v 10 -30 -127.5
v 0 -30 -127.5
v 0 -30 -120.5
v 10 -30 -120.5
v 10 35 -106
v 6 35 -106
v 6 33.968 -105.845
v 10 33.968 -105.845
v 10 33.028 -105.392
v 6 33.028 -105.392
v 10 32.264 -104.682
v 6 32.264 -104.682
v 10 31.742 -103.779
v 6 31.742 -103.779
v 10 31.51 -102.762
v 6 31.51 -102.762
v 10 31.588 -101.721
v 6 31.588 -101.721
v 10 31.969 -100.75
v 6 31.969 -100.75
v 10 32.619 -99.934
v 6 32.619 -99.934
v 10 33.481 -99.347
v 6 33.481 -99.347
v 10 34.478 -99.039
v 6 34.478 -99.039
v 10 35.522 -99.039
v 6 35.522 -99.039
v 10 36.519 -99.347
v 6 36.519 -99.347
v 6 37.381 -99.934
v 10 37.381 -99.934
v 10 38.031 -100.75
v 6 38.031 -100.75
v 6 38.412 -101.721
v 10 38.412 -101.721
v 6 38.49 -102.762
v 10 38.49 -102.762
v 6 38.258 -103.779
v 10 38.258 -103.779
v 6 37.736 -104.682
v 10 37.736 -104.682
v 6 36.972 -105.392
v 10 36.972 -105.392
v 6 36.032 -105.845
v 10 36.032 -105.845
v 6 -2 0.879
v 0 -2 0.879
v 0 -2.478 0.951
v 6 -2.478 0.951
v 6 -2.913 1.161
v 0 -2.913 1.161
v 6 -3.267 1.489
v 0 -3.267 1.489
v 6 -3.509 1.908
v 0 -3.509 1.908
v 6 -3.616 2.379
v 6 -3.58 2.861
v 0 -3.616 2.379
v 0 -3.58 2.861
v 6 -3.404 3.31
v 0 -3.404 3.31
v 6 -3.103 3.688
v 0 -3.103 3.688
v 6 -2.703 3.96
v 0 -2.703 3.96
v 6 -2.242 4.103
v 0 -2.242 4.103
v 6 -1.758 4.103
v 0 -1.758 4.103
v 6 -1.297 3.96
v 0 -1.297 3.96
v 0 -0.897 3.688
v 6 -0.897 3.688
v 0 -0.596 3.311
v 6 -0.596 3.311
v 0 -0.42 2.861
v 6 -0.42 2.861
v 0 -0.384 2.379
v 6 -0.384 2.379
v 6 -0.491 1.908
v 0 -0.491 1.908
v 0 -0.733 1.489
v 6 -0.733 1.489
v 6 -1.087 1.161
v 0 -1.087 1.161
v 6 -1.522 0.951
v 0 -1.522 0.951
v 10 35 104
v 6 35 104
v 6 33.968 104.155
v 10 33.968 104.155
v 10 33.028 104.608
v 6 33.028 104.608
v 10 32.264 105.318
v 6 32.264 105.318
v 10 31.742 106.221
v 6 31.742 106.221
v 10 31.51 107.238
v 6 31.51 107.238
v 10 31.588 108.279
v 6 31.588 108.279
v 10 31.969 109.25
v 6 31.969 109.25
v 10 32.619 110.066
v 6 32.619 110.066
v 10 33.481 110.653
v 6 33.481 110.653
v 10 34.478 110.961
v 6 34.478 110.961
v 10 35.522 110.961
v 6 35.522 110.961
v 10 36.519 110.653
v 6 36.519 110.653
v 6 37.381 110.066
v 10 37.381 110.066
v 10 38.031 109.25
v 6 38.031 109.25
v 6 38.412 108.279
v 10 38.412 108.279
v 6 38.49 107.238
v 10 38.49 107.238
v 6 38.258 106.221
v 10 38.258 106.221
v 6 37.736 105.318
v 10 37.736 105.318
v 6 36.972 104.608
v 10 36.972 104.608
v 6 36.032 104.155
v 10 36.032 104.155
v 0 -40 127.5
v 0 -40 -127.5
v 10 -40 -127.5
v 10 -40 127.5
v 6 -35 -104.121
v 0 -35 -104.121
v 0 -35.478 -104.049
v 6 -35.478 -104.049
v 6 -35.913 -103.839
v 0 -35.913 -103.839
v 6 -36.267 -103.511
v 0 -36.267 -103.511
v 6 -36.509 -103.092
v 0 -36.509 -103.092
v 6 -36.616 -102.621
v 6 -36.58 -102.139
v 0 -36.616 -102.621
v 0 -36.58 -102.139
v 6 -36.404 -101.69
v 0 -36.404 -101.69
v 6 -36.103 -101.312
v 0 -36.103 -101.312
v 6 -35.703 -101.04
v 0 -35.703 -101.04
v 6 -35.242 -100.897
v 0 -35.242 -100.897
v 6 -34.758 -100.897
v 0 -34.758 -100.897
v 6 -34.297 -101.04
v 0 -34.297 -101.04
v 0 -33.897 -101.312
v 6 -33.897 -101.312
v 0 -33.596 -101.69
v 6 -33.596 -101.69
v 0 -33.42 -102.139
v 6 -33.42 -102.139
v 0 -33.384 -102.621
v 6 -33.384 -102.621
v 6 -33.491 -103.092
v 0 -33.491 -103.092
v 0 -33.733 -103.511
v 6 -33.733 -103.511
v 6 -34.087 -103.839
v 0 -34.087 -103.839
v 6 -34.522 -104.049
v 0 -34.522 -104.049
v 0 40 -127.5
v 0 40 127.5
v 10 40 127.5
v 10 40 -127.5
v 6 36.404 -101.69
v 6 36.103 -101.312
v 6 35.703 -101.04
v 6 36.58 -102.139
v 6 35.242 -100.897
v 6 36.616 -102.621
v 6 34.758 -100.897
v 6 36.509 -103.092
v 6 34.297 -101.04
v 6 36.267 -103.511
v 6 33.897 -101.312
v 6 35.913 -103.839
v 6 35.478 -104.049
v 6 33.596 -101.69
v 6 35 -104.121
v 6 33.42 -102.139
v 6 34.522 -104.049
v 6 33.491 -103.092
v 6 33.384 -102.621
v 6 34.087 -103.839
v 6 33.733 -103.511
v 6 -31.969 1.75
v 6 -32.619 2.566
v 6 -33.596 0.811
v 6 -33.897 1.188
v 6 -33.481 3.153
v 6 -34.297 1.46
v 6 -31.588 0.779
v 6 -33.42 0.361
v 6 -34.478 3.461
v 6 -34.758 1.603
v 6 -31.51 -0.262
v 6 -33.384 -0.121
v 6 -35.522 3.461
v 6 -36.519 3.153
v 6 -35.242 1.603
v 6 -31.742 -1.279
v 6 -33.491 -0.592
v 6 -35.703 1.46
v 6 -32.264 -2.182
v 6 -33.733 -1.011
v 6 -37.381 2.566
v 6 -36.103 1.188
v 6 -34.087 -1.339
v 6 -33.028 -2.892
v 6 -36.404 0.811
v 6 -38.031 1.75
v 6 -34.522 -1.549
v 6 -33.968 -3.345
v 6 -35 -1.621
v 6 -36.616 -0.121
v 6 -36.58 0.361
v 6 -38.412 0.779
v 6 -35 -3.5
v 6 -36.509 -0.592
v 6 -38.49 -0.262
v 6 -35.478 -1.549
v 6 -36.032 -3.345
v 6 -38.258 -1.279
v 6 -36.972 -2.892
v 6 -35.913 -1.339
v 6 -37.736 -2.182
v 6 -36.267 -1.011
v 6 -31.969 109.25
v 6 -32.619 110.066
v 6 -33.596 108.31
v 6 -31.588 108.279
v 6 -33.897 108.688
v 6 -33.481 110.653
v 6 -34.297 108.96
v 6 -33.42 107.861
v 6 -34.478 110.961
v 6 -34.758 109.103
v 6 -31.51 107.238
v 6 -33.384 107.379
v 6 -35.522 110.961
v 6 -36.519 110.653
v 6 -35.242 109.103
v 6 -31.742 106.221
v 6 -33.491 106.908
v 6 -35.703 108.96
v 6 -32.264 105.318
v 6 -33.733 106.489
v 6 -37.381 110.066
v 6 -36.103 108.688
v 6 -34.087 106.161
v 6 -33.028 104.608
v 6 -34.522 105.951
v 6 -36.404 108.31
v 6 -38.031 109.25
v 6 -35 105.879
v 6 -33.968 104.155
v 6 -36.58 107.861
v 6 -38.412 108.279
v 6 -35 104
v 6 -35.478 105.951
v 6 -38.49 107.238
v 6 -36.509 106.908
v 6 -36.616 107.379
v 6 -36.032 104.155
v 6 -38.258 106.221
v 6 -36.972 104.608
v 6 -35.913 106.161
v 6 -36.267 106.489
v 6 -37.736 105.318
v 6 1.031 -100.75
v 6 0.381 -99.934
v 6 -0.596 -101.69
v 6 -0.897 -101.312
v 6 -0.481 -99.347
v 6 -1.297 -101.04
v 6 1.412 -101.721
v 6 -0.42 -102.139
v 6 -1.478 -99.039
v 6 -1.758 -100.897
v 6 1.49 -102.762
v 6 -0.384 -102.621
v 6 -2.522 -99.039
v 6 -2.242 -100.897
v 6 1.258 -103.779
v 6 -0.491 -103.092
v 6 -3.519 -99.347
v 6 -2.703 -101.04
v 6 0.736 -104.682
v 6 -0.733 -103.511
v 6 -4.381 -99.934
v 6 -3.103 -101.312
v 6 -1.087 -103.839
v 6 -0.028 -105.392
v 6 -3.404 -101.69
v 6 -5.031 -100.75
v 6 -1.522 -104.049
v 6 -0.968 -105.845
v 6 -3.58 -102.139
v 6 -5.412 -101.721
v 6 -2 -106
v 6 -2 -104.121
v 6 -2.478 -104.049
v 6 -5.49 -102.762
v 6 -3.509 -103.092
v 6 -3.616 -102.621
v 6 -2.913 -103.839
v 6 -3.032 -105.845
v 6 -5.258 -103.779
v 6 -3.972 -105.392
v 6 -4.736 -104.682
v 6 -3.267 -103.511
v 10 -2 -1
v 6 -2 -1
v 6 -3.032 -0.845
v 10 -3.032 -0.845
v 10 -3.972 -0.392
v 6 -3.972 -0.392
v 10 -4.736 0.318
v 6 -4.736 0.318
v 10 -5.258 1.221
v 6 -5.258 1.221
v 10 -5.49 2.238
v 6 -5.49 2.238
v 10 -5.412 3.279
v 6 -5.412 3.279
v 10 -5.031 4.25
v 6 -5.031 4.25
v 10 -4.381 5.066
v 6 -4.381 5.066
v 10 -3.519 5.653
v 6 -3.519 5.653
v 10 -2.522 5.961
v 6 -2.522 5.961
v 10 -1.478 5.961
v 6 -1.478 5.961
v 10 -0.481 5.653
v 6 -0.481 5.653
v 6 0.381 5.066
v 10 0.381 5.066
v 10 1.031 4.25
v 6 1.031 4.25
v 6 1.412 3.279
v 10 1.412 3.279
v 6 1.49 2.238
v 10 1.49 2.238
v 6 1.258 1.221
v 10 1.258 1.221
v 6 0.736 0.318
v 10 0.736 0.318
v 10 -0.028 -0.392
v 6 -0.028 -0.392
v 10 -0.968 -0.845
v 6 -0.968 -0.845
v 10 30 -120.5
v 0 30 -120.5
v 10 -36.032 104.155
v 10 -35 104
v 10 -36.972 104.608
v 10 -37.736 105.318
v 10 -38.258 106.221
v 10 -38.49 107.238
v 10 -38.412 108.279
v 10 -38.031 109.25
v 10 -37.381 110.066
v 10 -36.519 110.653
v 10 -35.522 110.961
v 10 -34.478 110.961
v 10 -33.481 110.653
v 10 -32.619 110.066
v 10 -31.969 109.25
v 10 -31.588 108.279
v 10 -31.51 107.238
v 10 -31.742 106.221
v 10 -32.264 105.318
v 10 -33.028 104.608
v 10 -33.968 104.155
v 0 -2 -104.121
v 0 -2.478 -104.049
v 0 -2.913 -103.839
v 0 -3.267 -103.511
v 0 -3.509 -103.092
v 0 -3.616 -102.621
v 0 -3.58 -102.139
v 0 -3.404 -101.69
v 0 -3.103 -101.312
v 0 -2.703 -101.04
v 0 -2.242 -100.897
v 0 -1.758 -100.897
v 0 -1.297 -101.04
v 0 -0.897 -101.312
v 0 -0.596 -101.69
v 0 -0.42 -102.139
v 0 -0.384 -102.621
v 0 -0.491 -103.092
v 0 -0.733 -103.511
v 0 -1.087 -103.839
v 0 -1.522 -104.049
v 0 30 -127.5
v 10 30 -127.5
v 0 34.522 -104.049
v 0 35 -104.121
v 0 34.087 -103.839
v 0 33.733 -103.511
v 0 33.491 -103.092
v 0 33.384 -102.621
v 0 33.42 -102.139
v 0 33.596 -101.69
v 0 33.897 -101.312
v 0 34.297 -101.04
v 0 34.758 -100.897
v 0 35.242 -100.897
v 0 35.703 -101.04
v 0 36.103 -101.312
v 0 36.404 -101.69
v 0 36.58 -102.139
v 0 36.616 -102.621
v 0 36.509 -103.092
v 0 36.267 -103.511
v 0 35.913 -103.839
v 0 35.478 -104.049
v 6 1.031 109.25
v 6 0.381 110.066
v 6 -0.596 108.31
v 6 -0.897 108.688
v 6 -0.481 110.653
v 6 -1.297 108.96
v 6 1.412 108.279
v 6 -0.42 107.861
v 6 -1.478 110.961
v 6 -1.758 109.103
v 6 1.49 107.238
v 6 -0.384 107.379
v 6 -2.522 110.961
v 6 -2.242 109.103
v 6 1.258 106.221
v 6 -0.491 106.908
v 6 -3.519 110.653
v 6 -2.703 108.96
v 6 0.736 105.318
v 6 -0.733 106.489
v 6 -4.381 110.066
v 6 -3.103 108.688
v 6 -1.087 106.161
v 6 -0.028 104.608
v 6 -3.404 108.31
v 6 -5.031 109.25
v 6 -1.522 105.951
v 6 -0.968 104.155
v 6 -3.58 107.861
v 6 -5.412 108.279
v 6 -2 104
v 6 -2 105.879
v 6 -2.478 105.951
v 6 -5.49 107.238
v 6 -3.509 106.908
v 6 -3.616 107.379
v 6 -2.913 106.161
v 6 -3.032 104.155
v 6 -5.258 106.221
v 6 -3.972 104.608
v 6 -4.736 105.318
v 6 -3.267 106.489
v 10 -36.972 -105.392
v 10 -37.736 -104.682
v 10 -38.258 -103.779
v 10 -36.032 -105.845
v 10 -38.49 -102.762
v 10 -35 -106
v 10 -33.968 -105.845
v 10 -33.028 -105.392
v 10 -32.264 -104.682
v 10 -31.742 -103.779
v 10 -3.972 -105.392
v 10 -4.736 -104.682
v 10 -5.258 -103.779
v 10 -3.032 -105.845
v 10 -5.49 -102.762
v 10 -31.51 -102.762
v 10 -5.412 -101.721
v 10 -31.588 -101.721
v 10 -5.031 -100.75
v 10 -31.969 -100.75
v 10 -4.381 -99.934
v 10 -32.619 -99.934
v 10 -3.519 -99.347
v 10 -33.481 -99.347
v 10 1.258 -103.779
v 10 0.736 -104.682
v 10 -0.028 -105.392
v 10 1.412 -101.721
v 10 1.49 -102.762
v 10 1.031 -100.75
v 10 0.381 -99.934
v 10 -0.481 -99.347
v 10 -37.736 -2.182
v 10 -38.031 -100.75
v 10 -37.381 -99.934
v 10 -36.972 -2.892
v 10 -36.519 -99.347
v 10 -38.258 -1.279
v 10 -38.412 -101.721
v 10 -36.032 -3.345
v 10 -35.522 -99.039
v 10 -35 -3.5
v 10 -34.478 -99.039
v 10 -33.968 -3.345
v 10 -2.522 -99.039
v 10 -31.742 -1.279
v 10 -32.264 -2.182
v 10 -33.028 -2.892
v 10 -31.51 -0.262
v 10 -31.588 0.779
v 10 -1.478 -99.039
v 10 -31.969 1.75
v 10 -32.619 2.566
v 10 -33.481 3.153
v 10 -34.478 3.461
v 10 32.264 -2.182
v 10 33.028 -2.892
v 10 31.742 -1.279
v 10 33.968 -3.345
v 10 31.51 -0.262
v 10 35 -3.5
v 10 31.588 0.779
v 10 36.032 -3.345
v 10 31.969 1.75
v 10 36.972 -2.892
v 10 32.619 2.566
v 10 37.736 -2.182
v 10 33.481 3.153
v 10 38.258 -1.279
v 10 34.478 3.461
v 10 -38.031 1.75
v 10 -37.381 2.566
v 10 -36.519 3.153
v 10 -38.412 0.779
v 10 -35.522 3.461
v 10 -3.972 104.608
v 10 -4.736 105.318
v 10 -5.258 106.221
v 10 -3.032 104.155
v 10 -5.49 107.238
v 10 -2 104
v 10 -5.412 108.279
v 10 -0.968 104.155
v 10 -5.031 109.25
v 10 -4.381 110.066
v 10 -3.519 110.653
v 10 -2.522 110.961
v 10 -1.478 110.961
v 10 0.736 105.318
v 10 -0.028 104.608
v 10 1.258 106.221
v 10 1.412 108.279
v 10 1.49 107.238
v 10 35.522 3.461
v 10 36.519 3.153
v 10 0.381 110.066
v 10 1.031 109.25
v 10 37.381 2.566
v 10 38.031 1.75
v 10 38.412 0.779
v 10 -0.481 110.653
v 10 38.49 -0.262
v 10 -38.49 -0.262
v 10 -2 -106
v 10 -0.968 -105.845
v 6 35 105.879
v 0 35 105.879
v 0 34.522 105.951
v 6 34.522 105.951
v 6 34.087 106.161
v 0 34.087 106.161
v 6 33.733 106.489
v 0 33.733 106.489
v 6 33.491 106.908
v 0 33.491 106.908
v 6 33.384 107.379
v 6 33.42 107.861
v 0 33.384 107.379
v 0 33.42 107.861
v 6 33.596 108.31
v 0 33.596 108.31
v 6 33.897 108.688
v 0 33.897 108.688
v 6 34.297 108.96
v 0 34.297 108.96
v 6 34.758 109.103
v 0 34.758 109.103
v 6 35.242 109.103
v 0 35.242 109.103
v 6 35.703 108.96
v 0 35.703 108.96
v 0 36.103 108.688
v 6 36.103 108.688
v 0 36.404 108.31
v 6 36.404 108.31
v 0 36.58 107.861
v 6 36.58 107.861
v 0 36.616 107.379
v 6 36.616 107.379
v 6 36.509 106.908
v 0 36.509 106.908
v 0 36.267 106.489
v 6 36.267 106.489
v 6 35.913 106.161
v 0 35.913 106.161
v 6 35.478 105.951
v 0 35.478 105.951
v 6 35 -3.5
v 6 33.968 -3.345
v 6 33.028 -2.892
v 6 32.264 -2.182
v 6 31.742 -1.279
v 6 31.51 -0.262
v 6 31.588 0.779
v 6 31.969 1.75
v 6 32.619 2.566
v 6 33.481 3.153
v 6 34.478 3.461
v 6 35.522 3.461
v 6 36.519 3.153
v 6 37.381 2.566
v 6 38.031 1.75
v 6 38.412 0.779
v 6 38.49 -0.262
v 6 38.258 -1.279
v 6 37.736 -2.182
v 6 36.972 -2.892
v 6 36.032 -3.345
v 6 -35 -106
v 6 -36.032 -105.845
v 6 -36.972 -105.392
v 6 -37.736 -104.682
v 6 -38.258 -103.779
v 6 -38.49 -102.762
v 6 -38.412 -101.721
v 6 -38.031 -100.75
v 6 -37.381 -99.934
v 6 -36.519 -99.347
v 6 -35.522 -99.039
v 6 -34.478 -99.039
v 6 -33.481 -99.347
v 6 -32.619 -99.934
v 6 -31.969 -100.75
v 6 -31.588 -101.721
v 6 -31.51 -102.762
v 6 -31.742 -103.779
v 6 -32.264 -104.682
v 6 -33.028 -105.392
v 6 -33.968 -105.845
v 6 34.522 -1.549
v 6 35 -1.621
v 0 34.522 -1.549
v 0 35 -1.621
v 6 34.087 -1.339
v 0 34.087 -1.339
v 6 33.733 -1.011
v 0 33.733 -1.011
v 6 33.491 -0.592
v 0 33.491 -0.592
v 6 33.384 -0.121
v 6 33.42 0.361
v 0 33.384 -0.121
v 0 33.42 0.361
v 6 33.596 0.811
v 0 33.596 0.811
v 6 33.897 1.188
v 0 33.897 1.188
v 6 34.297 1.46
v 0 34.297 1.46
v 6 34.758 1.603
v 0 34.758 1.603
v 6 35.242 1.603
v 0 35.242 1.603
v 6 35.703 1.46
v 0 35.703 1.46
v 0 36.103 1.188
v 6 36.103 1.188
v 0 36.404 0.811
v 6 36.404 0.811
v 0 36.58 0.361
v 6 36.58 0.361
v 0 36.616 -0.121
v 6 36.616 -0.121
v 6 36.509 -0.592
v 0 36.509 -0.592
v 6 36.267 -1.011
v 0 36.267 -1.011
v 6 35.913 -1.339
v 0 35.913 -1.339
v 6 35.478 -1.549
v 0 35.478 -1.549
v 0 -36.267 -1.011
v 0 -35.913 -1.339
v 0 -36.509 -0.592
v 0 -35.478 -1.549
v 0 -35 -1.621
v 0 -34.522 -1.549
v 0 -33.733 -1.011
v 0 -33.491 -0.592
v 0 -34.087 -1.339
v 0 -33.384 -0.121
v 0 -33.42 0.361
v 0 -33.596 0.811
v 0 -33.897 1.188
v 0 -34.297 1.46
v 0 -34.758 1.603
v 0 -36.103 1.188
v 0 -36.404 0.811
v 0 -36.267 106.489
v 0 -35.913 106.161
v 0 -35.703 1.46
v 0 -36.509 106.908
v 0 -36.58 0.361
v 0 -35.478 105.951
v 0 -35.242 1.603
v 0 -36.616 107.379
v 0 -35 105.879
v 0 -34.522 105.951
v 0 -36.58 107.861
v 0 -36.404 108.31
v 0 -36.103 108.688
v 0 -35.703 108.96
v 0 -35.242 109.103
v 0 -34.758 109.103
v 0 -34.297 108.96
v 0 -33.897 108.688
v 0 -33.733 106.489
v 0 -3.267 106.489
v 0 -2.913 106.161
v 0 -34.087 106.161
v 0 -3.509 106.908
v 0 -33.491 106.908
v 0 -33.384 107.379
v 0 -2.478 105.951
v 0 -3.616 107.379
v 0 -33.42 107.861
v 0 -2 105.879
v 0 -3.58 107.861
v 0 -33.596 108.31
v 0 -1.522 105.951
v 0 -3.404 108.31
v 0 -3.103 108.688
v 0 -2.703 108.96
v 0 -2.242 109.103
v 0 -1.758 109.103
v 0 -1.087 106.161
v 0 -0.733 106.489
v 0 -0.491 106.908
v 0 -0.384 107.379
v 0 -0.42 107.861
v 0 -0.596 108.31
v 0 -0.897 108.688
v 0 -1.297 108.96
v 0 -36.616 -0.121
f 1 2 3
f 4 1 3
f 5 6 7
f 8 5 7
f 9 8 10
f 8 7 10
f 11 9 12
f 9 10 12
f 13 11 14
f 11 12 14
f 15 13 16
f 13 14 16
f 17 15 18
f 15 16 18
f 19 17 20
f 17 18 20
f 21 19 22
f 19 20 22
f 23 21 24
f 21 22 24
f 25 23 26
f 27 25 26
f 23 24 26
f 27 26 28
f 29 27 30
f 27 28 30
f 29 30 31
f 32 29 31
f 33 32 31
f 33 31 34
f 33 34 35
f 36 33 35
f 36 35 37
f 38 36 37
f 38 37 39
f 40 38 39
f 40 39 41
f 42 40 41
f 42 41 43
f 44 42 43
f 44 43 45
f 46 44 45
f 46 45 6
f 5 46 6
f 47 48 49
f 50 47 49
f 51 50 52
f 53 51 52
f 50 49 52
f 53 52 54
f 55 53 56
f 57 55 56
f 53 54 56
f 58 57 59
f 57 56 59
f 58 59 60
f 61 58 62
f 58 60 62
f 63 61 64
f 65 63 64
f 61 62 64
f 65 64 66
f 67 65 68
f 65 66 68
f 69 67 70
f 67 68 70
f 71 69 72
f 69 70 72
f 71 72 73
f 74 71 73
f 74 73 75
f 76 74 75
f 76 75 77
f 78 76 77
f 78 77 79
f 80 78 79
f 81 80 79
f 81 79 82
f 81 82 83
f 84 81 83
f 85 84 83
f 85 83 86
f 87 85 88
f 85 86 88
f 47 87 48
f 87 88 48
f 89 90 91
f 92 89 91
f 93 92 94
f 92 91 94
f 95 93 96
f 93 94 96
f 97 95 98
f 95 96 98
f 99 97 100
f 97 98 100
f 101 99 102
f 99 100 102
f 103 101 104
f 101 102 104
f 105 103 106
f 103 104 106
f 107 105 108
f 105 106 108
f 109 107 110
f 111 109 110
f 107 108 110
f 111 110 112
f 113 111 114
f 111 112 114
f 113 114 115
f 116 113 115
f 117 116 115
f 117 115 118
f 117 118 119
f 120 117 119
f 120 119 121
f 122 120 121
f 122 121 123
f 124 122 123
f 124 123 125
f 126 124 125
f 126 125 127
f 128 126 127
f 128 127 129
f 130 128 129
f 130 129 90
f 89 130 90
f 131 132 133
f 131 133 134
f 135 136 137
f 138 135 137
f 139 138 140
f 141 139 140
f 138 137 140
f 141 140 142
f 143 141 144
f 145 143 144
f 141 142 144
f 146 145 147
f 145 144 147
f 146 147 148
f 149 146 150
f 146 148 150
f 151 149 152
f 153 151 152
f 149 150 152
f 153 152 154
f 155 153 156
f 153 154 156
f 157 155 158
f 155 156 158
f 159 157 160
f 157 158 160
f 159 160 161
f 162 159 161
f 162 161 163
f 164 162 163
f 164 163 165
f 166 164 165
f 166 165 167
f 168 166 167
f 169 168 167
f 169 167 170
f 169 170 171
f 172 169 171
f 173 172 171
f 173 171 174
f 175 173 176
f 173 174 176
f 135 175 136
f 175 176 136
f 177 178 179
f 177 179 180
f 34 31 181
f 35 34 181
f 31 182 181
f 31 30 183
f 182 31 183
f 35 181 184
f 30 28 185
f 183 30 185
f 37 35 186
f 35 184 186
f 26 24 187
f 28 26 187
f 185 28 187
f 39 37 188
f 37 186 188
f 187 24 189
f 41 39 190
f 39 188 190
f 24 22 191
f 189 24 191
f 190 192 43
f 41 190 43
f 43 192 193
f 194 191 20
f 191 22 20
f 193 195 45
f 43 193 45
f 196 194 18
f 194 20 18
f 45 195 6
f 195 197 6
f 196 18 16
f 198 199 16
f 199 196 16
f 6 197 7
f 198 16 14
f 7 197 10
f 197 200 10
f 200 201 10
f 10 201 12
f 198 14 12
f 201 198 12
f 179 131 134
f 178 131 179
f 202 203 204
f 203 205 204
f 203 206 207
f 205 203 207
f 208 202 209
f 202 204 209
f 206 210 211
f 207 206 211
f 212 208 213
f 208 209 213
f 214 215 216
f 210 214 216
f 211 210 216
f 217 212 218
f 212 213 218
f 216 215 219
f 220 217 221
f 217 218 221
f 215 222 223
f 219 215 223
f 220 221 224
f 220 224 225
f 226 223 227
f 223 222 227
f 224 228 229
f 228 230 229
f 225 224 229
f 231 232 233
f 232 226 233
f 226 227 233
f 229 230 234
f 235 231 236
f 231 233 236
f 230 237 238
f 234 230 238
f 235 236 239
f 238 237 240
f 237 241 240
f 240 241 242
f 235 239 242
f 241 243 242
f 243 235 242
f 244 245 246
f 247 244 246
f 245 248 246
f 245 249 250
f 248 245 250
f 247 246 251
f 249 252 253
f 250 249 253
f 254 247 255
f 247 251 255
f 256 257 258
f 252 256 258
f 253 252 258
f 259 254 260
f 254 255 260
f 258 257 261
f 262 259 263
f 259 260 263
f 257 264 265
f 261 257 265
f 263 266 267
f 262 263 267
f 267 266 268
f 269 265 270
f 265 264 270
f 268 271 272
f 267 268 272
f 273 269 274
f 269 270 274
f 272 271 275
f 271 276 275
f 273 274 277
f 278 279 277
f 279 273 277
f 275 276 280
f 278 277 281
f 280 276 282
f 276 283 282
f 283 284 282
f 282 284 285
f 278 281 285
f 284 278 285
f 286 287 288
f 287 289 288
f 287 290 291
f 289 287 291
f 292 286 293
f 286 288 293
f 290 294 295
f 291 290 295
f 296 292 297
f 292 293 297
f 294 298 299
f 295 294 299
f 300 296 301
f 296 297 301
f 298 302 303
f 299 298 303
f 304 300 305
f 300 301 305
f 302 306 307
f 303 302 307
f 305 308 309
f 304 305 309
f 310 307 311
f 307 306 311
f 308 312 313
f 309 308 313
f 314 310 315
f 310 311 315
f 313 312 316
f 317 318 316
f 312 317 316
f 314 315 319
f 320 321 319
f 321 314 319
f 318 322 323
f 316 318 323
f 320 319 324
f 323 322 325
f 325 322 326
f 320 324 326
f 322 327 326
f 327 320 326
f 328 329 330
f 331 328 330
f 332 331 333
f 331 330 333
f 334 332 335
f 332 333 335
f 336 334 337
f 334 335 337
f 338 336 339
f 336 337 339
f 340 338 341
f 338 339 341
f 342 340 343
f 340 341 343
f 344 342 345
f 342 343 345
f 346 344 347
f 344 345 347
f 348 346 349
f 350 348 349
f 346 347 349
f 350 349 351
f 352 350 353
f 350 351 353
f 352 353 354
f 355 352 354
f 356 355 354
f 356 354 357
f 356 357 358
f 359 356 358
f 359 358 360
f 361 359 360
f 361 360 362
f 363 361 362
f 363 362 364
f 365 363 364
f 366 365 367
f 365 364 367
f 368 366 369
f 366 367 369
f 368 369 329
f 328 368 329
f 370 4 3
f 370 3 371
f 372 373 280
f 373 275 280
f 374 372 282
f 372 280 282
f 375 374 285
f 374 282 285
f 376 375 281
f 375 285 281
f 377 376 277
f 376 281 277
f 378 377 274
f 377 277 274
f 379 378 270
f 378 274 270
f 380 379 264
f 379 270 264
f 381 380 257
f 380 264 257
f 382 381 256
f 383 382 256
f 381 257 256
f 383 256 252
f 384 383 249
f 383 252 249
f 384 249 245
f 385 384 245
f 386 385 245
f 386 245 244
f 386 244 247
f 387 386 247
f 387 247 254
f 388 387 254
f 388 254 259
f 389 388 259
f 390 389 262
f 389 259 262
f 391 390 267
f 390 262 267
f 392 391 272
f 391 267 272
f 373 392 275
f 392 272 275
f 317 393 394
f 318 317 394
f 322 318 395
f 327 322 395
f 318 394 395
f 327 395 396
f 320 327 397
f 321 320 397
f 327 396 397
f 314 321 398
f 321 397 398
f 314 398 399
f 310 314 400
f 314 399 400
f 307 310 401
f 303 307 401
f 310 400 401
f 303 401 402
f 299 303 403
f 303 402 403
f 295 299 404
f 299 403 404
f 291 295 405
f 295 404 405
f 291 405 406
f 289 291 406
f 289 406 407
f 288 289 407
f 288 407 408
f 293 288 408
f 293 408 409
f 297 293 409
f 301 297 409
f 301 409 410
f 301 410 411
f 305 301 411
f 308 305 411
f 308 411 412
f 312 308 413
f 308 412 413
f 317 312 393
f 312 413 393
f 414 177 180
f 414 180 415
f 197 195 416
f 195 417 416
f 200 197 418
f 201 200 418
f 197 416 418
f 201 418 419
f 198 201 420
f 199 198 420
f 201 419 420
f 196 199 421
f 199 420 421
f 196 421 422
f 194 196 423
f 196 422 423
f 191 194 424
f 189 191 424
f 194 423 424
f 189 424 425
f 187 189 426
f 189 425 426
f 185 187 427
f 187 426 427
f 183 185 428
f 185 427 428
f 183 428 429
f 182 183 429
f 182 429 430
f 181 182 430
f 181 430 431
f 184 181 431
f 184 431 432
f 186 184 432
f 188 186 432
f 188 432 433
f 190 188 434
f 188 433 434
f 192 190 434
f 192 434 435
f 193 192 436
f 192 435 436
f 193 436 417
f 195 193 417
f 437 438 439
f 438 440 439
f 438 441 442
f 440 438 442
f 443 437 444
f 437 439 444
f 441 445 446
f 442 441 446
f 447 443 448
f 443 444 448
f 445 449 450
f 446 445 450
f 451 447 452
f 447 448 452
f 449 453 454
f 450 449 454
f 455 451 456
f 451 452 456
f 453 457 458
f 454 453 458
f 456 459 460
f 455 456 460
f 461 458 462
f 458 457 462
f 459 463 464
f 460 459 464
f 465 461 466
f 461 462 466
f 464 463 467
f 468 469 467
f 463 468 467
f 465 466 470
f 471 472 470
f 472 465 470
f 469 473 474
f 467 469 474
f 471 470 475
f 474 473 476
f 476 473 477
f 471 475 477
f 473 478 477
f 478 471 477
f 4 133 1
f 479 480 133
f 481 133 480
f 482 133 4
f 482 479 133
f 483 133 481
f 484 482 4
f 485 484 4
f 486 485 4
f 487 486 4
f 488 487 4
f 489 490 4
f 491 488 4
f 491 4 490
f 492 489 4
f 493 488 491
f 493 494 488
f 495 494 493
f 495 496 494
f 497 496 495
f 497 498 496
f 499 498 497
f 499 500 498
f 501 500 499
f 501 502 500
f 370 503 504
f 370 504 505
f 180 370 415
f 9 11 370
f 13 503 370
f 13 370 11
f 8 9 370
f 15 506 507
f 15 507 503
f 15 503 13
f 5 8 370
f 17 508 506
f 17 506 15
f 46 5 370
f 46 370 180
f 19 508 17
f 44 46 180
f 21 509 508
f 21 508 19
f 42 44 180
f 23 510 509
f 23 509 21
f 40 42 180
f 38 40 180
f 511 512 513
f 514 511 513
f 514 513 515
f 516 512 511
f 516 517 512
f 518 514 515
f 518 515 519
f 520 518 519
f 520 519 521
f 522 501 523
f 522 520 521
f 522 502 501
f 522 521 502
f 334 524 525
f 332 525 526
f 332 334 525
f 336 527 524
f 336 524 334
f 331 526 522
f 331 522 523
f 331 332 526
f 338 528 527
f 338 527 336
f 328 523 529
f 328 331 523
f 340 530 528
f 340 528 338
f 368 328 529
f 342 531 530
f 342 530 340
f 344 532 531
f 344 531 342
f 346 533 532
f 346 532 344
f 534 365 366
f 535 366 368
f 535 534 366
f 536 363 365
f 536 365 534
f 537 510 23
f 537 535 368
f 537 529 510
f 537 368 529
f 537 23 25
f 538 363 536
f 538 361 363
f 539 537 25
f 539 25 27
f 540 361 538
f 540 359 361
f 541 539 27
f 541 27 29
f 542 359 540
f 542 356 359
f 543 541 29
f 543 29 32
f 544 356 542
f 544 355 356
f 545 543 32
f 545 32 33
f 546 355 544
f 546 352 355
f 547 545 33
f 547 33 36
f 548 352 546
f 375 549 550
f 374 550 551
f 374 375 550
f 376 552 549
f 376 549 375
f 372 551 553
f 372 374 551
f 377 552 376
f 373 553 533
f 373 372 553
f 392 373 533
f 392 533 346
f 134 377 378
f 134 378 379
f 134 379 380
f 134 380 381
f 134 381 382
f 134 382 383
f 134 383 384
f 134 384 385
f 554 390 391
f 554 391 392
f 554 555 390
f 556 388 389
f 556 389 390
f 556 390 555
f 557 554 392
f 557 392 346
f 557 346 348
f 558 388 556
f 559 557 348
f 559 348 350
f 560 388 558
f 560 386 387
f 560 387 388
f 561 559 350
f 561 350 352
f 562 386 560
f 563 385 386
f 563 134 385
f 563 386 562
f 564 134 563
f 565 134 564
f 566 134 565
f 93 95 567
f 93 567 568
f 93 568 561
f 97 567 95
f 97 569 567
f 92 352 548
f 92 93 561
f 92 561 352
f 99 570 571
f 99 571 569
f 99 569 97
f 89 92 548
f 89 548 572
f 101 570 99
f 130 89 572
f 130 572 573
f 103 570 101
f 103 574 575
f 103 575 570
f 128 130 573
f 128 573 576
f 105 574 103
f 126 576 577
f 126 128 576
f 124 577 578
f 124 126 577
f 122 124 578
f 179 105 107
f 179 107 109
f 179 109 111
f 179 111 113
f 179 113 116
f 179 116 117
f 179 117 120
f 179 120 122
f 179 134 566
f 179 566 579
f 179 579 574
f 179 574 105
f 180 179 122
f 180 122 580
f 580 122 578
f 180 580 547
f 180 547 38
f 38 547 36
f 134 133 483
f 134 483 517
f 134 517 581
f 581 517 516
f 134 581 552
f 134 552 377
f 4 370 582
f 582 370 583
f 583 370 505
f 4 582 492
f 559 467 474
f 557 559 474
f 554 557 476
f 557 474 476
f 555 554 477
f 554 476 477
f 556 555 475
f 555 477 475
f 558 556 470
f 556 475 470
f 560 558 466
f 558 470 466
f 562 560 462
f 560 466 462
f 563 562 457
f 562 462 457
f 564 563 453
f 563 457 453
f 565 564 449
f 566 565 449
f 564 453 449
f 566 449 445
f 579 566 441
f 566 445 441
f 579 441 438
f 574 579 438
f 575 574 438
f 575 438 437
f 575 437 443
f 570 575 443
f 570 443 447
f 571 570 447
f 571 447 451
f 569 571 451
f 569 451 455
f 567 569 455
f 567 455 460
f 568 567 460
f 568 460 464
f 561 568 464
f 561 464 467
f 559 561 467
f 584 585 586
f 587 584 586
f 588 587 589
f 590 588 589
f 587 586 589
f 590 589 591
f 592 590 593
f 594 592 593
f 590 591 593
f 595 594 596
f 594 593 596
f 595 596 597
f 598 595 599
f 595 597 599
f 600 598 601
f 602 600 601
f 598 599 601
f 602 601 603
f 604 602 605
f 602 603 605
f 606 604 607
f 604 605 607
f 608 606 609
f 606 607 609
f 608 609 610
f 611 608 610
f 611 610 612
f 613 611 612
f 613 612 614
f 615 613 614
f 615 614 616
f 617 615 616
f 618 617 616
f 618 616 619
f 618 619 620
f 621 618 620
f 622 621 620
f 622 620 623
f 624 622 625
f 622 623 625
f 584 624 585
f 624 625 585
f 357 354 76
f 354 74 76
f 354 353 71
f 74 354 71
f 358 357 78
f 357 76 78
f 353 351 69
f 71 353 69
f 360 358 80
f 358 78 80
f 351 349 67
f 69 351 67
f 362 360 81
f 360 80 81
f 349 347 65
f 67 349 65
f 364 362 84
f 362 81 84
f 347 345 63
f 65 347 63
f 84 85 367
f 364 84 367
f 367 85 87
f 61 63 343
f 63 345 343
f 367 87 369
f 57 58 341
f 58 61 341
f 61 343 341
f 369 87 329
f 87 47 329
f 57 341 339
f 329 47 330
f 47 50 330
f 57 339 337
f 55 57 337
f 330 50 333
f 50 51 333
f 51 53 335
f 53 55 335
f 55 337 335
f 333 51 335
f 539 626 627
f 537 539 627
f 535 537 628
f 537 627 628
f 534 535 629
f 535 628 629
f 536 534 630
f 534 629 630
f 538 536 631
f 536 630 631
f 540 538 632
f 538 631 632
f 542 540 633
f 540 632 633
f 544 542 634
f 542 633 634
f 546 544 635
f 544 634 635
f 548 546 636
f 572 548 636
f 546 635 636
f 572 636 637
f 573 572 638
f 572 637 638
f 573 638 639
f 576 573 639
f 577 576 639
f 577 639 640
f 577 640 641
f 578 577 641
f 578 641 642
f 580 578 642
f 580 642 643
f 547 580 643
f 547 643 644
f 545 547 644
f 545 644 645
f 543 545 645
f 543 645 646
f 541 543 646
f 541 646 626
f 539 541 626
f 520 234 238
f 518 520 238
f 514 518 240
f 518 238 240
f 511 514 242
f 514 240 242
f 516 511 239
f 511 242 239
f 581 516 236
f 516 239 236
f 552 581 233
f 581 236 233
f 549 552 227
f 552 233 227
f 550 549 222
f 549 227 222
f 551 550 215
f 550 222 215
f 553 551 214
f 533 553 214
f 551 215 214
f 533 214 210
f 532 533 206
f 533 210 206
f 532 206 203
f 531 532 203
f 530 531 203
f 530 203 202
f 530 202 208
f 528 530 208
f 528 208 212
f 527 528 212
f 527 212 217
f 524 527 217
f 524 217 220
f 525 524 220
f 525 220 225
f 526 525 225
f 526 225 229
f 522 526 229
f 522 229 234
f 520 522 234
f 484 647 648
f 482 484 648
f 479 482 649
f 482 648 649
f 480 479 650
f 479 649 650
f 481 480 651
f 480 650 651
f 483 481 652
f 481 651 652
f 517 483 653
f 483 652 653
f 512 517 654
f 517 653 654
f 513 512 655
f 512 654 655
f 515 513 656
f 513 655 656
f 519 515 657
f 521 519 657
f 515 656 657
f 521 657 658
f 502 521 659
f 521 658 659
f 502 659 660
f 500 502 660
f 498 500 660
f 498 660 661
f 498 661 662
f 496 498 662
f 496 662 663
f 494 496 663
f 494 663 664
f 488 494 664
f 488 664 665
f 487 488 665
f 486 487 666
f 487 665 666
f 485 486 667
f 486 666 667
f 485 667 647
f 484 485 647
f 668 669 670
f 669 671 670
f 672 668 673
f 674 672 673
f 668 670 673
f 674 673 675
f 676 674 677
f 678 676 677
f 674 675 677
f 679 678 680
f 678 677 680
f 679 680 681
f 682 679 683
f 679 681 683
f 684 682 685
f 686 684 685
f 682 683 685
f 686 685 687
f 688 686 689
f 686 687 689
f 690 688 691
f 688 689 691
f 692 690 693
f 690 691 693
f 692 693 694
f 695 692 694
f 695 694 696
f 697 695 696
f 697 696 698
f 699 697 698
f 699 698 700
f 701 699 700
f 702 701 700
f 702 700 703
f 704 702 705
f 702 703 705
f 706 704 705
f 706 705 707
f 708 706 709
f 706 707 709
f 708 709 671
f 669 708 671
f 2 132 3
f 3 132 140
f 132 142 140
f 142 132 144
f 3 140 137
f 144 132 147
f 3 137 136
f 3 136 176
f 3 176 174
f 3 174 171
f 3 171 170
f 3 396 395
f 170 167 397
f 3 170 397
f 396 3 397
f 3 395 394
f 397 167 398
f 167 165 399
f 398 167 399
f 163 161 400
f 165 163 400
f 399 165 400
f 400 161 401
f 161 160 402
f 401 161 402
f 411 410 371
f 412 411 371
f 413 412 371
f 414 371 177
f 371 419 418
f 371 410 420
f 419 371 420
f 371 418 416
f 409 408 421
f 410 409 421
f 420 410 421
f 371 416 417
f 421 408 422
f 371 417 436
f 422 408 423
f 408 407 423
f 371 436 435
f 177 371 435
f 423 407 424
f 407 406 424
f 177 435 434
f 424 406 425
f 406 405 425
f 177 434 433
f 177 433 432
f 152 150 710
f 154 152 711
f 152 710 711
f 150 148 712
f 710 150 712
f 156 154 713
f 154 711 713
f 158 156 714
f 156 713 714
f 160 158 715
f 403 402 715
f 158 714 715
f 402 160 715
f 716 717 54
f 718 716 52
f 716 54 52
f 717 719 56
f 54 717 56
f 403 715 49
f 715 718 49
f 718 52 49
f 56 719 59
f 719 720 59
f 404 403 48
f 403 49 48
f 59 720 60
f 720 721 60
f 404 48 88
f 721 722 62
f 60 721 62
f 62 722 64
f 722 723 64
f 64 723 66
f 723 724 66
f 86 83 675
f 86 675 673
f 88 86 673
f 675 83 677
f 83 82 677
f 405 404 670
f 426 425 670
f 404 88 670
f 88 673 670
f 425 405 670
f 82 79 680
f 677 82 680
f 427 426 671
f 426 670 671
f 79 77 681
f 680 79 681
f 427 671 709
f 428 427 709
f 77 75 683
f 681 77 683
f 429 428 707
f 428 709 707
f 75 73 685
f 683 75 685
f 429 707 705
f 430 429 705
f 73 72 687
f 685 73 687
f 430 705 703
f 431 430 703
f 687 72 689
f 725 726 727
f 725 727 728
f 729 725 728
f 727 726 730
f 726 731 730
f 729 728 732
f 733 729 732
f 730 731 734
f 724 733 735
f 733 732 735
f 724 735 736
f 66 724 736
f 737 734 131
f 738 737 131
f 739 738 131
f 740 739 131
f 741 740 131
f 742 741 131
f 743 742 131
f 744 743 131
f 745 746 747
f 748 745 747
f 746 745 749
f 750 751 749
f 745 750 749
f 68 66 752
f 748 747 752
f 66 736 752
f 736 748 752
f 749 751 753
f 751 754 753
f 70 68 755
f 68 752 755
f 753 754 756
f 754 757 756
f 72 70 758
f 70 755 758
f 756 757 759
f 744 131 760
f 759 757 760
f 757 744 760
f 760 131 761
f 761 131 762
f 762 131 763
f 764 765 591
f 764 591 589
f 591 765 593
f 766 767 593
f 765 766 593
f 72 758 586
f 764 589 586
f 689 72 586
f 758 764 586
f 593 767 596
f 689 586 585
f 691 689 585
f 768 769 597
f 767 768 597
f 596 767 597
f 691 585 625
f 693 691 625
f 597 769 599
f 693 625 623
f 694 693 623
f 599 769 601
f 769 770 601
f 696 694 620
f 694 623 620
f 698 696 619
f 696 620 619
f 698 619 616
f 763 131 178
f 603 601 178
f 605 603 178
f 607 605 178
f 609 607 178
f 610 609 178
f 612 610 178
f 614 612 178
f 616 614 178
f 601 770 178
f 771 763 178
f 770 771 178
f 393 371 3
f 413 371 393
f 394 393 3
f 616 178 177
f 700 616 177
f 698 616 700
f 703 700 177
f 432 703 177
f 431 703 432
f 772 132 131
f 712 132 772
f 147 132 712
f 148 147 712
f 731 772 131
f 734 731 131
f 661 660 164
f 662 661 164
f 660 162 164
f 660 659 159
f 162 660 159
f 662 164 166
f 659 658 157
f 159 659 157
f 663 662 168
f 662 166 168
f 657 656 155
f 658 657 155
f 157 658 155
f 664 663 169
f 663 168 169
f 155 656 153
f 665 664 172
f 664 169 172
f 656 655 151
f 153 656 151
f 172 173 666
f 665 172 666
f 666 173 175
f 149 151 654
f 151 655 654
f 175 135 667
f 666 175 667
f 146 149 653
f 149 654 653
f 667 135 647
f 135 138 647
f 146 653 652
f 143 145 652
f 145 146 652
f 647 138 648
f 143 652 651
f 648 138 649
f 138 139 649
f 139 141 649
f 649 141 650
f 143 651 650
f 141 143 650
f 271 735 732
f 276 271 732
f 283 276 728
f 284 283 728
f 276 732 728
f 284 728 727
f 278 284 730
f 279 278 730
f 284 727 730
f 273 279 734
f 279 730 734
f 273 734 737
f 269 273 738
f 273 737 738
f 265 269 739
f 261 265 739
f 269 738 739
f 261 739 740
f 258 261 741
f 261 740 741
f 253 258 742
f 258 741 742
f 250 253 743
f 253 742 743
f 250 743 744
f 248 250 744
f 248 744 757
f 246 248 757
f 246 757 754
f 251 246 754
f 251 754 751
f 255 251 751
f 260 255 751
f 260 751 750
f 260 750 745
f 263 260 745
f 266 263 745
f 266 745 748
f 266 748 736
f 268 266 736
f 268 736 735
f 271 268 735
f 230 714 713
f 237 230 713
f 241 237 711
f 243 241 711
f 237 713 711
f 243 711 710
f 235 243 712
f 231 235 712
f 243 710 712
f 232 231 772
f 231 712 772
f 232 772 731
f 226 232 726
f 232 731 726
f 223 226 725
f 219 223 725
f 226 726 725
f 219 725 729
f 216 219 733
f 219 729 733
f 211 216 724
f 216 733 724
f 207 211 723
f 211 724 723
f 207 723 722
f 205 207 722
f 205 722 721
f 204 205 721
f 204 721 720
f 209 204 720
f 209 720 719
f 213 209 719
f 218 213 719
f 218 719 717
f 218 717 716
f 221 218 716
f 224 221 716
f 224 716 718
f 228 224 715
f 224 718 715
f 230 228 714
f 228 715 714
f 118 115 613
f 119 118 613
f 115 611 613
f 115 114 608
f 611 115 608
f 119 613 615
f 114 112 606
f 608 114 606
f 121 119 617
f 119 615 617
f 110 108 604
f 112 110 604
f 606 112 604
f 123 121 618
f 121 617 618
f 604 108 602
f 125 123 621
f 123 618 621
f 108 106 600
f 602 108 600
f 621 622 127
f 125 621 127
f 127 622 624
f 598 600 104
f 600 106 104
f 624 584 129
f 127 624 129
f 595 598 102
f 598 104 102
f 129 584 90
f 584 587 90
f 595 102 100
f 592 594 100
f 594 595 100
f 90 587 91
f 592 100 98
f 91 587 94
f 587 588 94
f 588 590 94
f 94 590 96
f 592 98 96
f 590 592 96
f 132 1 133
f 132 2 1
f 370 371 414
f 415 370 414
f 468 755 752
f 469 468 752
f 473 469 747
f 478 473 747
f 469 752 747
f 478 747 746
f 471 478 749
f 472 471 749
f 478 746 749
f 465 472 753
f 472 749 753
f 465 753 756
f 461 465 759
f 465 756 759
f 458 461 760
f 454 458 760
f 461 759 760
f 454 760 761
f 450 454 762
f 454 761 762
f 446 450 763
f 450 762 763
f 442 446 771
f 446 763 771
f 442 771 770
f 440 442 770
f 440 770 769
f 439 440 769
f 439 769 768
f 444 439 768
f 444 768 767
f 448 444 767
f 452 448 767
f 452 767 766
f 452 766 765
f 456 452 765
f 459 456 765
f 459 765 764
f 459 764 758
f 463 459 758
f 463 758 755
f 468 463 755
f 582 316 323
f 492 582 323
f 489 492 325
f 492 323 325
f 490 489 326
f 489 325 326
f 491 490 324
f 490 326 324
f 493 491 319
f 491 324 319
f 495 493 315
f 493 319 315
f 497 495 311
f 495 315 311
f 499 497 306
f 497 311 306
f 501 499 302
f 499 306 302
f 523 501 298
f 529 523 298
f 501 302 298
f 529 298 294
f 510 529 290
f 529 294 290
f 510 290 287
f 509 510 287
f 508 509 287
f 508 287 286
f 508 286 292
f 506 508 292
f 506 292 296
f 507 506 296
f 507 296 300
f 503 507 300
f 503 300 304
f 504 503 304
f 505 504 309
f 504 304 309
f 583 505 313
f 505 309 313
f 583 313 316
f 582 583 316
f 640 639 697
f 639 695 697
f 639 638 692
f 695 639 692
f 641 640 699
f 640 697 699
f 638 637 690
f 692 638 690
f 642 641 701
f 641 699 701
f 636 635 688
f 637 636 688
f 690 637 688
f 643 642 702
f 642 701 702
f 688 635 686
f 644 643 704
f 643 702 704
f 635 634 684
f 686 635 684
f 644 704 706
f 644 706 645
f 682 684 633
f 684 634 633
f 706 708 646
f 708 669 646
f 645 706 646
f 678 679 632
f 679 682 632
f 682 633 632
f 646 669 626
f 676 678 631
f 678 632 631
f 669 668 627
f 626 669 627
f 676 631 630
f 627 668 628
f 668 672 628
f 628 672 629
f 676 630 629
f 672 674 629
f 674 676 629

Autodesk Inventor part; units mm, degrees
ref_plane "YZ Plane" through (0, 0, 0) normal (1, 0, 0) x (0, 1, 0)
ref_plane "XZ Plane" through (0, 0, 0) normal (0, 1, 0) x (-1, 0, 0)
ref_plane "XY Plane" through (0, 0, 0) normal (0, 0, 1) x (1, 0, 0)
sketch "Skizze1" plane through (0, 0, 0) normal (1, 0, 0) x (0, 1, 0)
  line L0 (-40, 127.5) -> (40, 127.5)
  line L1 (40, 127.5) -> (40, -127.5)
  line L2 (40, -127.5) -> (-40, -127.5)
  line L3 (-40, -127.5) -> (-40, 127.5)
  line L4 (-40, 127.5) -> (40, -127.5) construction
  line L5 (40, 127.5) -> (-40, -127.5) construction
  point P0 (0, 0)
  dimension "d0" = 80
  dimension "d1" = 255
extrude "Extrusion1" add sketch "Skizze1" along normal blind 10
sketch "Skizze2" plane through (10, 0, 0) normal (1, 0, 0) x (0, 0, -1)
  line L0 (-127.5, 40) -> (-127.5, -40) projected
  line L1 (127.5, -40) -> (127.5, 40) projected
  line L2 (127.5, 40) -> (-127.5, 40) projected
  line L3 (-127.5, -35) -> (127.5, -35) construction
  line L4 (-127.5, -40) -> (127.5, -40) projected
  line L5 (178.5, 0) -> (-178.5, 0) projected
  point P0 (0, 0)
  point P1 (-107.5, -2)
  point P2 (-2.5, -2)
  point P3 (102.5, -2)
  point P4 (-107.5, -35)
  point P5 (0, -35)
  point P6 (102.5, -35)
  point P7 (-107.5, 35)
  point P8 (0, 35)
  point P9 (102.5, 35)
  dimension "d4" = 20
  dimension "d5" = 25
  dimension "d6" = 105
  dimension "d7" = 42
  dimension "d8" = 42
  dimension "d9" = 42
  dimension "d27" = 5
hole "Bohrung1" at (10, -2, 107.5) at (10, -2, 2.5) at (10, -2, -102.5) at (10, -35, 107.5) at (10, -35, 0) at (10, -35, -102.5) at (10, 35, -102.5) at (10, 35, 0) at (10, 35, 107.5) direction (-1, 0, 0) diameter 3.242 end through all counterbore diameter 7 counterbore depth 4 thread size "M4x0.7" class "6H" standard "ISO Metric profile"
sketch "Skizze5" plane through (10, 0, 0) normal (1, 0, 0) x (0, 0, -1)
  line L0 (127.5, -40) -> (127.5, 40) projected
  line L1 (127.5, -30) -> (120.5, -30)
  line L2 (120.5, -30) -> (120.5, 30)
  line L3 (120.5, 30) -> (127.5, 30)
  line L4 (127.5, 30) -> (127.5, -30)
  line L5 (-127.5, -40) -> (127.5, -40) projected
  point P0 (0, 0)
  point P1 (124, -30)
  point P2 (124, 30)
  dimension "d28" = 7
  dimension "d29" = 60
  dimension "d30" = 10
extrude "Extrusion2" cut sketch "Skizze5" against normal blind 10
equation "\"d8\" = d7"
equation "\"d9\" = d7"
properties part number "ER_Wand_1"
